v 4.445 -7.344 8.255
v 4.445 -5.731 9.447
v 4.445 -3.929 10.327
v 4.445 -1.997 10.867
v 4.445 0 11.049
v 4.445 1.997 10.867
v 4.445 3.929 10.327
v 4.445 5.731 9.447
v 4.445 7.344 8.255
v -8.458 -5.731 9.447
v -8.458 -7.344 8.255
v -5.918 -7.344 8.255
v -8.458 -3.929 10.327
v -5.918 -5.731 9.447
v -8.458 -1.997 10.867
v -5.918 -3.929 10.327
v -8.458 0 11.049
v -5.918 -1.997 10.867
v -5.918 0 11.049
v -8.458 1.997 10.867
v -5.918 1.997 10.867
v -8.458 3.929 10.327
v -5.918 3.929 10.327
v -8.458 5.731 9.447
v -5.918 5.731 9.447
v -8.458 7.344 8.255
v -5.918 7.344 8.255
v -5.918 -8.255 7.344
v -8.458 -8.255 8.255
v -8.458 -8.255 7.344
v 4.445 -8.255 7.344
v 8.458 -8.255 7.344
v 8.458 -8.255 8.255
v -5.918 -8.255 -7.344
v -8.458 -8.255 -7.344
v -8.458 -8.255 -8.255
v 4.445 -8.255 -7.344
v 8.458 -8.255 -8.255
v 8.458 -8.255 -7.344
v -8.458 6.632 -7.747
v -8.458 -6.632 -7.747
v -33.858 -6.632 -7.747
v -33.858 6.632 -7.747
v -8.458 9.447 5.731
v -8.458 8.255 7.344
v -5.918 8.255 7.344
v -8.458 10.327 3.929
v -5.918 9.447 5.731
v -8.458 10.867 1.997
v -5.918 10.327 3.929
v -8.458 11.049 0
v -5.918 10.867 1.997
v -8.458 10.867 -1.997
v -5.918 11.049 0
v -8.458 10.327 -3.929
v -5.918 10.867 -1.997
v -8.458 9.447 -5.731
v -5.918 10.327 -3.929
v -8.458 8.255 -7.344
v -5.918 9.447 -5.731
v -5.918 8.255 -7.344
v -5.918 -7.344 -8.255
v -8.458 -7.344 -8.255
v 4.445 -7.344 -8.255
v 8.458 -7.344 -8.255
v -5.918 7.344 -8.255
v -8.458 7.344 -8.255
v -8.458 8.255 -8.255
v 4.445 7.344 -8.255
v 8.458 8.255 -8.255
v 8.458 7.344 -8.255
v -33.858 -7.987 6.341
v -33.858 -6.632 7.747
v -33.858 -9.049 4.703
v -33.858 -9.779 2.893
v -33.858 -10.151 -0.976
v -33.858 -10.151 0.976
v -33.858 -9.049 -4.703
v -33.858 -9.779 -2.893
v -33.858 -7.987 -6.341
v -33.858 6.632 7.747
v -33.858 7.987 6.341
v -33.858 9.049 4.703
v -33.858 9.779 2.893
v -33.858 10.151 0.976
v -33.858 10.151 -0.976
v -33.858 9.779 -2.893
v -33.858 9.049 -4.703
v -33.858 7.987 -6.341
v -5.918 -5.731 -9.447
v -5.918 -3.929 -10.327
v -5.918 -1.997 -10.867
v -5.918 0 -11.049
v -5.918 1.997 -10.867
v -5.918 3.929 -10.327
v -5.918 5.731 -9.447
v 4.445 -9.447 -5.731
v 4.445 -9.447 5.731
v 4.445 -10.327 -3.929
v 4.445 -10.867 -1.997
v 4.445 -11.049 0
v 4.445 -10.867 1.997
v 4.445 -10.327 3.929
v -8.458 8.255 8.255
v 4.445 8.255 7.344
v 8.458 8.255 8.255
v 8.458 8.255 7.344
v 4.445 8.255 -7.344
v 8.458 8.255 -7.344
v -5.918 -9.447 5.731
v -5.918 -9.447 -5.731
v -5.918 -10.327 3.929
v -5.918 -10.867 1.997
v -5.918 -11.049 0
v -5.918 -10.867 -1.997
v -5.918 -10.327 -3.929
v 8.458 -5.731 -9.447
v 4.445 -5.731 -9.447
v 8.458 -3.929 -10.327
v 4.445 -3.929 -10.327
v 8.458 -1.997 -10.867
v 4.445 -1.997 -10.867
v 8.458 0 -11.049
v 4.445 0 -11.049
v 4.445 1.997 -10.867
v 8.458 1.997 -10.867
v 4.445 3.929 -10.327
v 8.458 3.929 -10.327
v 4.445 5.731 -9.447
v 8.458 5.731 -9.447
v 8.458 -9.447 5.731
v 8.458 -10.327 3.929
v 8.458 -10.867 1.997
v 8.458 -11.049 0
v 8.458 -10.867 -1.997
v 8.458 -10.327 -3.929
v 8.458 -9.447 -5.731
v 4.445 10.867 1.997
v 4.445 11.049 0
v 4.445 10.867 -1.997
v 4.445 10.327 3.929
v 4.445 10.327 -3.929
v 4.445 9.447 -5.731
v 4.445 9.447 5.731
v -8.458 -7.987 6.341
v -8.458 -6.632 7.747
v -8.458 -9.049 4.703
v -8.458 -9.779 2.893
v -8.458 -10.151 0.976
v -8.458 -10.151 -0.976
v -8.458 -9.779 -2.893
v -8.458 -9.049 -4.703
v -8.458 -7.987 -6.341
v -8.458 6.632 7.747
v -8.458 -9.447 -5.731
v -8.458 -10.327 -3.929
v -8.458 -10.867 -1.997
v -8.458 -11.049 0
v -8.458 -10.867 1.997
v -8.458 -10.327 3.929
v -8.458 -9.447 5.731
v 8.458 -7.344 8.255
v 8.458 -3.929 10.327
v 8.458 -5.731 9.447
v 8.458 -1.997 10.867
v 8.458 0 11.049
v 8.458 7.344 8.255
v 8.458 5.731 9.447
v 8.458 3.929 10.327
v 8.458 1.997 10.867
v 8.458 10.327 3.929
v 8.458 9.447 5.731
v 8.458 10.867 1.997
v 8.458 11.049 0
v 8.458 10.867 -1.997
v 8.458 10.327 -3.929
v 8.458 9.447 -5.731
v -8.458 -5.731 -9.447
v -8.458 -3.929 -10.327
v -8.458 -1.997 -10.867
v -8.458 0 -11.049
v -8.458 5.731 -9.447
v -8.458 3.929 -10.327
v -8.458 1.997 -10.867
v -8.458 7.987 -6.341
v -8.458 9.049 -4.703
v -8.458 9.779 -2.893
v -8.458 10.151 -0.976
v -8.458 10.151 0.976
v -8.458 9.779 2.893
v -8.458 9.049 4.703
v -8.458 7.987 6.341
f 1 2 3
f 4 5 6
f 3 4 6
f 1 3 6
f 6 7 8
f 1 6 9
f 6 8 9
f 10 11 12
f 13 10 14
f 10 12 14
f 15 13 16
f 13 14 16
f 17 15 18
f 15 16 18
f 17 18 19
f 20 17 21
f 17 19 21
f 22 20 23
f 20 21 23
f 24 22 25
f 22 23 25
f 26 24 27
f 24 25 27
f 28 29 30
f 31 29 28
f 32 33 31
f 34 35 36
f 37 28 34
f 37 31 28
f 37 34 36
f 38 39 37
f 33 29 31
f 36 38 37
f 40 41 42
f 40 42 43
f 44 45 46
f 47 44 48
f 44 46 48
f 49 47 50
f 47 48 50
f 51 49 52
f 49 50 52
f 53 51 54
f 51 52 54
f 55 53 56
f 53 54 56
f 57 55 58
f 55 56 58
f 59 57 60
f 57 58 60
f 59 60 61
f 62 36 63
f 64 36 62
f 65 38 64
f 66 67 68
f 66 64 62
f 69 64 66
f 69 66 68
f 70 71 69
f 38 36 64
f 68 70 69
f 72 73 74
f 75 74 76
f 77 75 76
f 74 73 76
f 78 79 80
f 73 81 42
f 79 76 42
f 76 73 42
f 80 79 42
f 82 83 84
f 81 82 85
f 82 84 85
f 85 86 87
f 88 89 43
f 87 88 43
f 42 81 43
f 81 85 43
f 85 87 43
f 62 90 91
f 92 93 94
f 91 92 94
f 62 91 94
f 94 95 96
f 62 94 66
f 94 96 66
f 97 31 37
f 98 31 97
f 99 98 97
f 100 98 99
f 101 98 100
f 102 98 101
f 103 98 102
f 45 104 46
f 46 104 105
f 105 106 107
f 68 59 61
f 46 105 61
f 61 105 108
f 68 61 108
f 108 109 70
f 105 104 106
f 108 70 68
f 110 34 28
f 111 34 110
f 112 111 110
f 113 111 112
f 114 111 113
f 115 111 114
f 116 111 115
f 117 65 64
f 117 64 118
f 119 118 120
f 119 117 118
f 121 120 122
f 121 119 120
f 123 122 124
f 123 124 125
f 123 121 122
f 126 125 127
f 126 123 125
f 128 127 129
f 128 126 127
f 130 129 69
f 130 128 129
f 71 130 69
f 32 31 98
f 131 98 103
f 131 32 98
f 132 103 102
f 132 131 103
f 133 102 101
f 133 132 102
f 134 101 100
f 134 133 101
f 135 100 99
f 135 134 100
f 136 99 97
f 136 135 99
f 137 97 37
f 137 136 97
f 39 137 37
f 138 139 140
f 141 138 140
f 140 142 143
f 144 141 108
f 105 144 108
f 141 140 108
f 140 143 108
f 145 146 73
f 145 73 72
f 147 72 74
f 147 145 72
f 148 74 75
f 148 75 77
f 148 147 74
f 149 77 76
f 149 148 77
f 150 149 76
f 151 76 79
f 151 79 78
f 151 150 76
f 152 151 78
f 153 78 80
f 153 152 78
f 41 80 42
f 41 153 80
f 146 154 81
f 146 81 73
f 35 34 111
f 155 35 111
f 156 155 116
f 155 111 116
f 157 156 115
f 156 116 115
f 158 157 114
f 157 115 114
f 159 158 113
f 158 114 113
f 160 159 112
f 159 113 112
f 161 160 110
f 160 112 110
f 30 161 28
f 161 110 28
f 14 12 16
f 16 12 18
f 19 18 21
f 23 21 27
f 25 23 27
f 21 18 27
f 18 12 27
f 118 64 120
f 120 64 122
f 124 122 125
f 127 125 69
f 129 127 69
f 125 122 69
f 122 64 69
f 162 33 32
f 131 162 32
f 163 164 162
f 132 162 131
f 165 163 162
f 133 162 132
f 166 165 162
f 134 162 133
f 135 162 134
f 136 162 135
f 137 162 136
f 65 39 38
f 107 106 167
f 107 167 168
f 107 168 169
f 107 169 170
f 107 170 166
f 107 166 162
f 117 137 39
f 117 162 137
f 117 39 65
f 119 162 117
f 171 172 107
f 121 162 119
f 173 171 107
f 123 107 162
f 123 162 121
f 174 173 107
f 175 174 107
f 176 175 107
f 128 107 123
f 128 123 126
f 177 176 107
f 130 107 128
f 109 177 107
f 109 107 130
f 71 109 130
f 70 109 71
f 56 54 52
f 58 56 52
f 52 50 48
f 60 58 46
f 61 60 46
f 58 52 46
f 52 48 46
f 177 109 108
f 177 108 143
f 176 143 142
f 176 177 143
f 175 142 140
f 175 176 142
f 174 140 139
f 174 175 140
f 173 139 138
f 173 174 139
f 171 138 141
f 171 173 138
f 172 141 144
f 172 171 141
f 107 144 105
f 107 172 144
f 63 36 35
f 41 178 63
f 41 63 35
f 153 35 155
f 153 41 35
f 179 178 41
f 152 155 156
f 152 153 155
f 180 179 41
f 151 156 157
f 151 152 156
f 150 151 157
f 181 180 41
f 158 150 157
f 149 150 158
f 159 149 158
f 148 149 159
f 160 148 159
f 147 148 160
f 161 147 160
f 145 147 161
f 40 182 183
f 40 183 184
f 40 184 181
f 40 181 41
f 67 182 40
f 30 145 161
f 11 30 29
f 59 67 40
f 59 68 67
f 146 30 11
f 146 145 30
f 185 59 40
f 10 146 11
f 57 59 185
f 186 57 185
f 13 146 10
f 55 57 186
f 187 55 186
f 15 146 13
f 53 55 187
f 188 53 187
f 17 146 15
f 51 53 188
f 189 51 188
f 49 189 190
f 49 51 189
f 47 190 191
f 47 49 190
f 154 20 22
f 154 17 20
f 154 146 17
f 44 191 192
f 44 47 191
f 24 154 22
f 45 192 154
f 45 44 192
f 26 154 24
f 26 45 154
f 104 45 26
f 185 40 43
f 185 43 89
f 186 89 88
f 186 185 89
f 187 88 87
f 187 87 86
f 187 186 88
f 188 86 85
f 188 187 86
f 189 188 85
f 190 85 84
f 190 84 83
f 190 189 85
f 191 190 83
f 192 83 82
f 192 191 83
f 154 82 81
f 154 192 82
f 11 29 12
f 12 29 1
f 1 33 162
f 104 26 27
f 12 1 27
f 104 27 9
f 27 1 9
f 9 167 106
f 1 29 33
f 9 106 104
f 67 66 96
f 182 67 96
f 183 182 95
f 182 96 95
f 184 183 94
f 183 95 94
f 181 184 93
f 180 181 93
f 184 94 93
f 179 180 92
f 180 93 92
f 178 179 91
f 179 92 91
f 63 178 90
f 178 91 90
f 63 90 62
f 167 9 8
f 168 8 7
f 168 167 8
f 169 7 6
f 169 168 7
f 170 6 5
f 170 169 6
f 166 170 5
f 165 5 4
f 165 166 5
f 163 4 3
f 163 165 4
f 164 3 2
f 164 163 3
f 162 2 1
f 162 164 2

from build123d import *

# Parameters (mm, degrees)
SKETCH1_W           = 16.51
SKETCH1_H           = 16.51
BOSS_EXTRUDE1_DEPTH = 8.4582
SKETCH2_R           = 11.049
BOSS_EXTRUDE2_DEPTH = 4.0132
BOSS_EXTRUDE3_START = -2.54
SKETCH3_R           = 11.049
BOSS_EXTRUDE3_DEPTH = 2.54
BOSS_EXTRUDE4_DEPTH = 25.4


with BuildPart() as part:
    # Sketch1 → Boss-Extrude1 (new, symmetric)
    with BuildSketch(Plane(origin=(0, 0, 0), x_dir=(0, 0, -1), z_dir=(1, 0, 0))):
        Rectangle(SKETCH1_W, SKETCH1_H)
    extrude(amount=BOSS_EXTRUDE1_DEPTH, both=True)

    # Sketch2 → Boss-Extrude2 (add)
    with BuildSketch(Plane(origin=(8.4582, 0, 0), x_dir=(0, 0, -1), z_dir=(1, 0, 0))):
        Circle(SKETCH2_R)
    extrude(amount=-BOSS_EXTRUDE2_DEPTH)

    # Sketch3 → Boss-Extrude3 (add)
    with BuildSketch(Plane.ZY.offset(8.4582).offset(BOSS_EXTRUDE3_START)):
        Circle(SKETCH3_R)
    extrude(amount=BOSS_EXTRUDE3_DEPTH)

    # Sketch4 → Boss-Extrude4 (add)
    with BuildSketch(Plane.ZY.offset(8.4582)):
        with BuildLine():
            Line((-7.747, -6.632136504), (-7.747, 6.632136504))
            ThreePointArc((-7.747, 6.632136504), (0, 10.1981), (7.747, 6.632136504))
            Line((7.747, 6.632136504), (7.747, -6.632136504))
            ThreePointArc((7.747, -6.632136504), (0, -10.1981), (-7.747, -6.632136504))
        make_face()
    extrude(amount=BOSS_EXTRUDE4_DEPTH)


solid = part.part
